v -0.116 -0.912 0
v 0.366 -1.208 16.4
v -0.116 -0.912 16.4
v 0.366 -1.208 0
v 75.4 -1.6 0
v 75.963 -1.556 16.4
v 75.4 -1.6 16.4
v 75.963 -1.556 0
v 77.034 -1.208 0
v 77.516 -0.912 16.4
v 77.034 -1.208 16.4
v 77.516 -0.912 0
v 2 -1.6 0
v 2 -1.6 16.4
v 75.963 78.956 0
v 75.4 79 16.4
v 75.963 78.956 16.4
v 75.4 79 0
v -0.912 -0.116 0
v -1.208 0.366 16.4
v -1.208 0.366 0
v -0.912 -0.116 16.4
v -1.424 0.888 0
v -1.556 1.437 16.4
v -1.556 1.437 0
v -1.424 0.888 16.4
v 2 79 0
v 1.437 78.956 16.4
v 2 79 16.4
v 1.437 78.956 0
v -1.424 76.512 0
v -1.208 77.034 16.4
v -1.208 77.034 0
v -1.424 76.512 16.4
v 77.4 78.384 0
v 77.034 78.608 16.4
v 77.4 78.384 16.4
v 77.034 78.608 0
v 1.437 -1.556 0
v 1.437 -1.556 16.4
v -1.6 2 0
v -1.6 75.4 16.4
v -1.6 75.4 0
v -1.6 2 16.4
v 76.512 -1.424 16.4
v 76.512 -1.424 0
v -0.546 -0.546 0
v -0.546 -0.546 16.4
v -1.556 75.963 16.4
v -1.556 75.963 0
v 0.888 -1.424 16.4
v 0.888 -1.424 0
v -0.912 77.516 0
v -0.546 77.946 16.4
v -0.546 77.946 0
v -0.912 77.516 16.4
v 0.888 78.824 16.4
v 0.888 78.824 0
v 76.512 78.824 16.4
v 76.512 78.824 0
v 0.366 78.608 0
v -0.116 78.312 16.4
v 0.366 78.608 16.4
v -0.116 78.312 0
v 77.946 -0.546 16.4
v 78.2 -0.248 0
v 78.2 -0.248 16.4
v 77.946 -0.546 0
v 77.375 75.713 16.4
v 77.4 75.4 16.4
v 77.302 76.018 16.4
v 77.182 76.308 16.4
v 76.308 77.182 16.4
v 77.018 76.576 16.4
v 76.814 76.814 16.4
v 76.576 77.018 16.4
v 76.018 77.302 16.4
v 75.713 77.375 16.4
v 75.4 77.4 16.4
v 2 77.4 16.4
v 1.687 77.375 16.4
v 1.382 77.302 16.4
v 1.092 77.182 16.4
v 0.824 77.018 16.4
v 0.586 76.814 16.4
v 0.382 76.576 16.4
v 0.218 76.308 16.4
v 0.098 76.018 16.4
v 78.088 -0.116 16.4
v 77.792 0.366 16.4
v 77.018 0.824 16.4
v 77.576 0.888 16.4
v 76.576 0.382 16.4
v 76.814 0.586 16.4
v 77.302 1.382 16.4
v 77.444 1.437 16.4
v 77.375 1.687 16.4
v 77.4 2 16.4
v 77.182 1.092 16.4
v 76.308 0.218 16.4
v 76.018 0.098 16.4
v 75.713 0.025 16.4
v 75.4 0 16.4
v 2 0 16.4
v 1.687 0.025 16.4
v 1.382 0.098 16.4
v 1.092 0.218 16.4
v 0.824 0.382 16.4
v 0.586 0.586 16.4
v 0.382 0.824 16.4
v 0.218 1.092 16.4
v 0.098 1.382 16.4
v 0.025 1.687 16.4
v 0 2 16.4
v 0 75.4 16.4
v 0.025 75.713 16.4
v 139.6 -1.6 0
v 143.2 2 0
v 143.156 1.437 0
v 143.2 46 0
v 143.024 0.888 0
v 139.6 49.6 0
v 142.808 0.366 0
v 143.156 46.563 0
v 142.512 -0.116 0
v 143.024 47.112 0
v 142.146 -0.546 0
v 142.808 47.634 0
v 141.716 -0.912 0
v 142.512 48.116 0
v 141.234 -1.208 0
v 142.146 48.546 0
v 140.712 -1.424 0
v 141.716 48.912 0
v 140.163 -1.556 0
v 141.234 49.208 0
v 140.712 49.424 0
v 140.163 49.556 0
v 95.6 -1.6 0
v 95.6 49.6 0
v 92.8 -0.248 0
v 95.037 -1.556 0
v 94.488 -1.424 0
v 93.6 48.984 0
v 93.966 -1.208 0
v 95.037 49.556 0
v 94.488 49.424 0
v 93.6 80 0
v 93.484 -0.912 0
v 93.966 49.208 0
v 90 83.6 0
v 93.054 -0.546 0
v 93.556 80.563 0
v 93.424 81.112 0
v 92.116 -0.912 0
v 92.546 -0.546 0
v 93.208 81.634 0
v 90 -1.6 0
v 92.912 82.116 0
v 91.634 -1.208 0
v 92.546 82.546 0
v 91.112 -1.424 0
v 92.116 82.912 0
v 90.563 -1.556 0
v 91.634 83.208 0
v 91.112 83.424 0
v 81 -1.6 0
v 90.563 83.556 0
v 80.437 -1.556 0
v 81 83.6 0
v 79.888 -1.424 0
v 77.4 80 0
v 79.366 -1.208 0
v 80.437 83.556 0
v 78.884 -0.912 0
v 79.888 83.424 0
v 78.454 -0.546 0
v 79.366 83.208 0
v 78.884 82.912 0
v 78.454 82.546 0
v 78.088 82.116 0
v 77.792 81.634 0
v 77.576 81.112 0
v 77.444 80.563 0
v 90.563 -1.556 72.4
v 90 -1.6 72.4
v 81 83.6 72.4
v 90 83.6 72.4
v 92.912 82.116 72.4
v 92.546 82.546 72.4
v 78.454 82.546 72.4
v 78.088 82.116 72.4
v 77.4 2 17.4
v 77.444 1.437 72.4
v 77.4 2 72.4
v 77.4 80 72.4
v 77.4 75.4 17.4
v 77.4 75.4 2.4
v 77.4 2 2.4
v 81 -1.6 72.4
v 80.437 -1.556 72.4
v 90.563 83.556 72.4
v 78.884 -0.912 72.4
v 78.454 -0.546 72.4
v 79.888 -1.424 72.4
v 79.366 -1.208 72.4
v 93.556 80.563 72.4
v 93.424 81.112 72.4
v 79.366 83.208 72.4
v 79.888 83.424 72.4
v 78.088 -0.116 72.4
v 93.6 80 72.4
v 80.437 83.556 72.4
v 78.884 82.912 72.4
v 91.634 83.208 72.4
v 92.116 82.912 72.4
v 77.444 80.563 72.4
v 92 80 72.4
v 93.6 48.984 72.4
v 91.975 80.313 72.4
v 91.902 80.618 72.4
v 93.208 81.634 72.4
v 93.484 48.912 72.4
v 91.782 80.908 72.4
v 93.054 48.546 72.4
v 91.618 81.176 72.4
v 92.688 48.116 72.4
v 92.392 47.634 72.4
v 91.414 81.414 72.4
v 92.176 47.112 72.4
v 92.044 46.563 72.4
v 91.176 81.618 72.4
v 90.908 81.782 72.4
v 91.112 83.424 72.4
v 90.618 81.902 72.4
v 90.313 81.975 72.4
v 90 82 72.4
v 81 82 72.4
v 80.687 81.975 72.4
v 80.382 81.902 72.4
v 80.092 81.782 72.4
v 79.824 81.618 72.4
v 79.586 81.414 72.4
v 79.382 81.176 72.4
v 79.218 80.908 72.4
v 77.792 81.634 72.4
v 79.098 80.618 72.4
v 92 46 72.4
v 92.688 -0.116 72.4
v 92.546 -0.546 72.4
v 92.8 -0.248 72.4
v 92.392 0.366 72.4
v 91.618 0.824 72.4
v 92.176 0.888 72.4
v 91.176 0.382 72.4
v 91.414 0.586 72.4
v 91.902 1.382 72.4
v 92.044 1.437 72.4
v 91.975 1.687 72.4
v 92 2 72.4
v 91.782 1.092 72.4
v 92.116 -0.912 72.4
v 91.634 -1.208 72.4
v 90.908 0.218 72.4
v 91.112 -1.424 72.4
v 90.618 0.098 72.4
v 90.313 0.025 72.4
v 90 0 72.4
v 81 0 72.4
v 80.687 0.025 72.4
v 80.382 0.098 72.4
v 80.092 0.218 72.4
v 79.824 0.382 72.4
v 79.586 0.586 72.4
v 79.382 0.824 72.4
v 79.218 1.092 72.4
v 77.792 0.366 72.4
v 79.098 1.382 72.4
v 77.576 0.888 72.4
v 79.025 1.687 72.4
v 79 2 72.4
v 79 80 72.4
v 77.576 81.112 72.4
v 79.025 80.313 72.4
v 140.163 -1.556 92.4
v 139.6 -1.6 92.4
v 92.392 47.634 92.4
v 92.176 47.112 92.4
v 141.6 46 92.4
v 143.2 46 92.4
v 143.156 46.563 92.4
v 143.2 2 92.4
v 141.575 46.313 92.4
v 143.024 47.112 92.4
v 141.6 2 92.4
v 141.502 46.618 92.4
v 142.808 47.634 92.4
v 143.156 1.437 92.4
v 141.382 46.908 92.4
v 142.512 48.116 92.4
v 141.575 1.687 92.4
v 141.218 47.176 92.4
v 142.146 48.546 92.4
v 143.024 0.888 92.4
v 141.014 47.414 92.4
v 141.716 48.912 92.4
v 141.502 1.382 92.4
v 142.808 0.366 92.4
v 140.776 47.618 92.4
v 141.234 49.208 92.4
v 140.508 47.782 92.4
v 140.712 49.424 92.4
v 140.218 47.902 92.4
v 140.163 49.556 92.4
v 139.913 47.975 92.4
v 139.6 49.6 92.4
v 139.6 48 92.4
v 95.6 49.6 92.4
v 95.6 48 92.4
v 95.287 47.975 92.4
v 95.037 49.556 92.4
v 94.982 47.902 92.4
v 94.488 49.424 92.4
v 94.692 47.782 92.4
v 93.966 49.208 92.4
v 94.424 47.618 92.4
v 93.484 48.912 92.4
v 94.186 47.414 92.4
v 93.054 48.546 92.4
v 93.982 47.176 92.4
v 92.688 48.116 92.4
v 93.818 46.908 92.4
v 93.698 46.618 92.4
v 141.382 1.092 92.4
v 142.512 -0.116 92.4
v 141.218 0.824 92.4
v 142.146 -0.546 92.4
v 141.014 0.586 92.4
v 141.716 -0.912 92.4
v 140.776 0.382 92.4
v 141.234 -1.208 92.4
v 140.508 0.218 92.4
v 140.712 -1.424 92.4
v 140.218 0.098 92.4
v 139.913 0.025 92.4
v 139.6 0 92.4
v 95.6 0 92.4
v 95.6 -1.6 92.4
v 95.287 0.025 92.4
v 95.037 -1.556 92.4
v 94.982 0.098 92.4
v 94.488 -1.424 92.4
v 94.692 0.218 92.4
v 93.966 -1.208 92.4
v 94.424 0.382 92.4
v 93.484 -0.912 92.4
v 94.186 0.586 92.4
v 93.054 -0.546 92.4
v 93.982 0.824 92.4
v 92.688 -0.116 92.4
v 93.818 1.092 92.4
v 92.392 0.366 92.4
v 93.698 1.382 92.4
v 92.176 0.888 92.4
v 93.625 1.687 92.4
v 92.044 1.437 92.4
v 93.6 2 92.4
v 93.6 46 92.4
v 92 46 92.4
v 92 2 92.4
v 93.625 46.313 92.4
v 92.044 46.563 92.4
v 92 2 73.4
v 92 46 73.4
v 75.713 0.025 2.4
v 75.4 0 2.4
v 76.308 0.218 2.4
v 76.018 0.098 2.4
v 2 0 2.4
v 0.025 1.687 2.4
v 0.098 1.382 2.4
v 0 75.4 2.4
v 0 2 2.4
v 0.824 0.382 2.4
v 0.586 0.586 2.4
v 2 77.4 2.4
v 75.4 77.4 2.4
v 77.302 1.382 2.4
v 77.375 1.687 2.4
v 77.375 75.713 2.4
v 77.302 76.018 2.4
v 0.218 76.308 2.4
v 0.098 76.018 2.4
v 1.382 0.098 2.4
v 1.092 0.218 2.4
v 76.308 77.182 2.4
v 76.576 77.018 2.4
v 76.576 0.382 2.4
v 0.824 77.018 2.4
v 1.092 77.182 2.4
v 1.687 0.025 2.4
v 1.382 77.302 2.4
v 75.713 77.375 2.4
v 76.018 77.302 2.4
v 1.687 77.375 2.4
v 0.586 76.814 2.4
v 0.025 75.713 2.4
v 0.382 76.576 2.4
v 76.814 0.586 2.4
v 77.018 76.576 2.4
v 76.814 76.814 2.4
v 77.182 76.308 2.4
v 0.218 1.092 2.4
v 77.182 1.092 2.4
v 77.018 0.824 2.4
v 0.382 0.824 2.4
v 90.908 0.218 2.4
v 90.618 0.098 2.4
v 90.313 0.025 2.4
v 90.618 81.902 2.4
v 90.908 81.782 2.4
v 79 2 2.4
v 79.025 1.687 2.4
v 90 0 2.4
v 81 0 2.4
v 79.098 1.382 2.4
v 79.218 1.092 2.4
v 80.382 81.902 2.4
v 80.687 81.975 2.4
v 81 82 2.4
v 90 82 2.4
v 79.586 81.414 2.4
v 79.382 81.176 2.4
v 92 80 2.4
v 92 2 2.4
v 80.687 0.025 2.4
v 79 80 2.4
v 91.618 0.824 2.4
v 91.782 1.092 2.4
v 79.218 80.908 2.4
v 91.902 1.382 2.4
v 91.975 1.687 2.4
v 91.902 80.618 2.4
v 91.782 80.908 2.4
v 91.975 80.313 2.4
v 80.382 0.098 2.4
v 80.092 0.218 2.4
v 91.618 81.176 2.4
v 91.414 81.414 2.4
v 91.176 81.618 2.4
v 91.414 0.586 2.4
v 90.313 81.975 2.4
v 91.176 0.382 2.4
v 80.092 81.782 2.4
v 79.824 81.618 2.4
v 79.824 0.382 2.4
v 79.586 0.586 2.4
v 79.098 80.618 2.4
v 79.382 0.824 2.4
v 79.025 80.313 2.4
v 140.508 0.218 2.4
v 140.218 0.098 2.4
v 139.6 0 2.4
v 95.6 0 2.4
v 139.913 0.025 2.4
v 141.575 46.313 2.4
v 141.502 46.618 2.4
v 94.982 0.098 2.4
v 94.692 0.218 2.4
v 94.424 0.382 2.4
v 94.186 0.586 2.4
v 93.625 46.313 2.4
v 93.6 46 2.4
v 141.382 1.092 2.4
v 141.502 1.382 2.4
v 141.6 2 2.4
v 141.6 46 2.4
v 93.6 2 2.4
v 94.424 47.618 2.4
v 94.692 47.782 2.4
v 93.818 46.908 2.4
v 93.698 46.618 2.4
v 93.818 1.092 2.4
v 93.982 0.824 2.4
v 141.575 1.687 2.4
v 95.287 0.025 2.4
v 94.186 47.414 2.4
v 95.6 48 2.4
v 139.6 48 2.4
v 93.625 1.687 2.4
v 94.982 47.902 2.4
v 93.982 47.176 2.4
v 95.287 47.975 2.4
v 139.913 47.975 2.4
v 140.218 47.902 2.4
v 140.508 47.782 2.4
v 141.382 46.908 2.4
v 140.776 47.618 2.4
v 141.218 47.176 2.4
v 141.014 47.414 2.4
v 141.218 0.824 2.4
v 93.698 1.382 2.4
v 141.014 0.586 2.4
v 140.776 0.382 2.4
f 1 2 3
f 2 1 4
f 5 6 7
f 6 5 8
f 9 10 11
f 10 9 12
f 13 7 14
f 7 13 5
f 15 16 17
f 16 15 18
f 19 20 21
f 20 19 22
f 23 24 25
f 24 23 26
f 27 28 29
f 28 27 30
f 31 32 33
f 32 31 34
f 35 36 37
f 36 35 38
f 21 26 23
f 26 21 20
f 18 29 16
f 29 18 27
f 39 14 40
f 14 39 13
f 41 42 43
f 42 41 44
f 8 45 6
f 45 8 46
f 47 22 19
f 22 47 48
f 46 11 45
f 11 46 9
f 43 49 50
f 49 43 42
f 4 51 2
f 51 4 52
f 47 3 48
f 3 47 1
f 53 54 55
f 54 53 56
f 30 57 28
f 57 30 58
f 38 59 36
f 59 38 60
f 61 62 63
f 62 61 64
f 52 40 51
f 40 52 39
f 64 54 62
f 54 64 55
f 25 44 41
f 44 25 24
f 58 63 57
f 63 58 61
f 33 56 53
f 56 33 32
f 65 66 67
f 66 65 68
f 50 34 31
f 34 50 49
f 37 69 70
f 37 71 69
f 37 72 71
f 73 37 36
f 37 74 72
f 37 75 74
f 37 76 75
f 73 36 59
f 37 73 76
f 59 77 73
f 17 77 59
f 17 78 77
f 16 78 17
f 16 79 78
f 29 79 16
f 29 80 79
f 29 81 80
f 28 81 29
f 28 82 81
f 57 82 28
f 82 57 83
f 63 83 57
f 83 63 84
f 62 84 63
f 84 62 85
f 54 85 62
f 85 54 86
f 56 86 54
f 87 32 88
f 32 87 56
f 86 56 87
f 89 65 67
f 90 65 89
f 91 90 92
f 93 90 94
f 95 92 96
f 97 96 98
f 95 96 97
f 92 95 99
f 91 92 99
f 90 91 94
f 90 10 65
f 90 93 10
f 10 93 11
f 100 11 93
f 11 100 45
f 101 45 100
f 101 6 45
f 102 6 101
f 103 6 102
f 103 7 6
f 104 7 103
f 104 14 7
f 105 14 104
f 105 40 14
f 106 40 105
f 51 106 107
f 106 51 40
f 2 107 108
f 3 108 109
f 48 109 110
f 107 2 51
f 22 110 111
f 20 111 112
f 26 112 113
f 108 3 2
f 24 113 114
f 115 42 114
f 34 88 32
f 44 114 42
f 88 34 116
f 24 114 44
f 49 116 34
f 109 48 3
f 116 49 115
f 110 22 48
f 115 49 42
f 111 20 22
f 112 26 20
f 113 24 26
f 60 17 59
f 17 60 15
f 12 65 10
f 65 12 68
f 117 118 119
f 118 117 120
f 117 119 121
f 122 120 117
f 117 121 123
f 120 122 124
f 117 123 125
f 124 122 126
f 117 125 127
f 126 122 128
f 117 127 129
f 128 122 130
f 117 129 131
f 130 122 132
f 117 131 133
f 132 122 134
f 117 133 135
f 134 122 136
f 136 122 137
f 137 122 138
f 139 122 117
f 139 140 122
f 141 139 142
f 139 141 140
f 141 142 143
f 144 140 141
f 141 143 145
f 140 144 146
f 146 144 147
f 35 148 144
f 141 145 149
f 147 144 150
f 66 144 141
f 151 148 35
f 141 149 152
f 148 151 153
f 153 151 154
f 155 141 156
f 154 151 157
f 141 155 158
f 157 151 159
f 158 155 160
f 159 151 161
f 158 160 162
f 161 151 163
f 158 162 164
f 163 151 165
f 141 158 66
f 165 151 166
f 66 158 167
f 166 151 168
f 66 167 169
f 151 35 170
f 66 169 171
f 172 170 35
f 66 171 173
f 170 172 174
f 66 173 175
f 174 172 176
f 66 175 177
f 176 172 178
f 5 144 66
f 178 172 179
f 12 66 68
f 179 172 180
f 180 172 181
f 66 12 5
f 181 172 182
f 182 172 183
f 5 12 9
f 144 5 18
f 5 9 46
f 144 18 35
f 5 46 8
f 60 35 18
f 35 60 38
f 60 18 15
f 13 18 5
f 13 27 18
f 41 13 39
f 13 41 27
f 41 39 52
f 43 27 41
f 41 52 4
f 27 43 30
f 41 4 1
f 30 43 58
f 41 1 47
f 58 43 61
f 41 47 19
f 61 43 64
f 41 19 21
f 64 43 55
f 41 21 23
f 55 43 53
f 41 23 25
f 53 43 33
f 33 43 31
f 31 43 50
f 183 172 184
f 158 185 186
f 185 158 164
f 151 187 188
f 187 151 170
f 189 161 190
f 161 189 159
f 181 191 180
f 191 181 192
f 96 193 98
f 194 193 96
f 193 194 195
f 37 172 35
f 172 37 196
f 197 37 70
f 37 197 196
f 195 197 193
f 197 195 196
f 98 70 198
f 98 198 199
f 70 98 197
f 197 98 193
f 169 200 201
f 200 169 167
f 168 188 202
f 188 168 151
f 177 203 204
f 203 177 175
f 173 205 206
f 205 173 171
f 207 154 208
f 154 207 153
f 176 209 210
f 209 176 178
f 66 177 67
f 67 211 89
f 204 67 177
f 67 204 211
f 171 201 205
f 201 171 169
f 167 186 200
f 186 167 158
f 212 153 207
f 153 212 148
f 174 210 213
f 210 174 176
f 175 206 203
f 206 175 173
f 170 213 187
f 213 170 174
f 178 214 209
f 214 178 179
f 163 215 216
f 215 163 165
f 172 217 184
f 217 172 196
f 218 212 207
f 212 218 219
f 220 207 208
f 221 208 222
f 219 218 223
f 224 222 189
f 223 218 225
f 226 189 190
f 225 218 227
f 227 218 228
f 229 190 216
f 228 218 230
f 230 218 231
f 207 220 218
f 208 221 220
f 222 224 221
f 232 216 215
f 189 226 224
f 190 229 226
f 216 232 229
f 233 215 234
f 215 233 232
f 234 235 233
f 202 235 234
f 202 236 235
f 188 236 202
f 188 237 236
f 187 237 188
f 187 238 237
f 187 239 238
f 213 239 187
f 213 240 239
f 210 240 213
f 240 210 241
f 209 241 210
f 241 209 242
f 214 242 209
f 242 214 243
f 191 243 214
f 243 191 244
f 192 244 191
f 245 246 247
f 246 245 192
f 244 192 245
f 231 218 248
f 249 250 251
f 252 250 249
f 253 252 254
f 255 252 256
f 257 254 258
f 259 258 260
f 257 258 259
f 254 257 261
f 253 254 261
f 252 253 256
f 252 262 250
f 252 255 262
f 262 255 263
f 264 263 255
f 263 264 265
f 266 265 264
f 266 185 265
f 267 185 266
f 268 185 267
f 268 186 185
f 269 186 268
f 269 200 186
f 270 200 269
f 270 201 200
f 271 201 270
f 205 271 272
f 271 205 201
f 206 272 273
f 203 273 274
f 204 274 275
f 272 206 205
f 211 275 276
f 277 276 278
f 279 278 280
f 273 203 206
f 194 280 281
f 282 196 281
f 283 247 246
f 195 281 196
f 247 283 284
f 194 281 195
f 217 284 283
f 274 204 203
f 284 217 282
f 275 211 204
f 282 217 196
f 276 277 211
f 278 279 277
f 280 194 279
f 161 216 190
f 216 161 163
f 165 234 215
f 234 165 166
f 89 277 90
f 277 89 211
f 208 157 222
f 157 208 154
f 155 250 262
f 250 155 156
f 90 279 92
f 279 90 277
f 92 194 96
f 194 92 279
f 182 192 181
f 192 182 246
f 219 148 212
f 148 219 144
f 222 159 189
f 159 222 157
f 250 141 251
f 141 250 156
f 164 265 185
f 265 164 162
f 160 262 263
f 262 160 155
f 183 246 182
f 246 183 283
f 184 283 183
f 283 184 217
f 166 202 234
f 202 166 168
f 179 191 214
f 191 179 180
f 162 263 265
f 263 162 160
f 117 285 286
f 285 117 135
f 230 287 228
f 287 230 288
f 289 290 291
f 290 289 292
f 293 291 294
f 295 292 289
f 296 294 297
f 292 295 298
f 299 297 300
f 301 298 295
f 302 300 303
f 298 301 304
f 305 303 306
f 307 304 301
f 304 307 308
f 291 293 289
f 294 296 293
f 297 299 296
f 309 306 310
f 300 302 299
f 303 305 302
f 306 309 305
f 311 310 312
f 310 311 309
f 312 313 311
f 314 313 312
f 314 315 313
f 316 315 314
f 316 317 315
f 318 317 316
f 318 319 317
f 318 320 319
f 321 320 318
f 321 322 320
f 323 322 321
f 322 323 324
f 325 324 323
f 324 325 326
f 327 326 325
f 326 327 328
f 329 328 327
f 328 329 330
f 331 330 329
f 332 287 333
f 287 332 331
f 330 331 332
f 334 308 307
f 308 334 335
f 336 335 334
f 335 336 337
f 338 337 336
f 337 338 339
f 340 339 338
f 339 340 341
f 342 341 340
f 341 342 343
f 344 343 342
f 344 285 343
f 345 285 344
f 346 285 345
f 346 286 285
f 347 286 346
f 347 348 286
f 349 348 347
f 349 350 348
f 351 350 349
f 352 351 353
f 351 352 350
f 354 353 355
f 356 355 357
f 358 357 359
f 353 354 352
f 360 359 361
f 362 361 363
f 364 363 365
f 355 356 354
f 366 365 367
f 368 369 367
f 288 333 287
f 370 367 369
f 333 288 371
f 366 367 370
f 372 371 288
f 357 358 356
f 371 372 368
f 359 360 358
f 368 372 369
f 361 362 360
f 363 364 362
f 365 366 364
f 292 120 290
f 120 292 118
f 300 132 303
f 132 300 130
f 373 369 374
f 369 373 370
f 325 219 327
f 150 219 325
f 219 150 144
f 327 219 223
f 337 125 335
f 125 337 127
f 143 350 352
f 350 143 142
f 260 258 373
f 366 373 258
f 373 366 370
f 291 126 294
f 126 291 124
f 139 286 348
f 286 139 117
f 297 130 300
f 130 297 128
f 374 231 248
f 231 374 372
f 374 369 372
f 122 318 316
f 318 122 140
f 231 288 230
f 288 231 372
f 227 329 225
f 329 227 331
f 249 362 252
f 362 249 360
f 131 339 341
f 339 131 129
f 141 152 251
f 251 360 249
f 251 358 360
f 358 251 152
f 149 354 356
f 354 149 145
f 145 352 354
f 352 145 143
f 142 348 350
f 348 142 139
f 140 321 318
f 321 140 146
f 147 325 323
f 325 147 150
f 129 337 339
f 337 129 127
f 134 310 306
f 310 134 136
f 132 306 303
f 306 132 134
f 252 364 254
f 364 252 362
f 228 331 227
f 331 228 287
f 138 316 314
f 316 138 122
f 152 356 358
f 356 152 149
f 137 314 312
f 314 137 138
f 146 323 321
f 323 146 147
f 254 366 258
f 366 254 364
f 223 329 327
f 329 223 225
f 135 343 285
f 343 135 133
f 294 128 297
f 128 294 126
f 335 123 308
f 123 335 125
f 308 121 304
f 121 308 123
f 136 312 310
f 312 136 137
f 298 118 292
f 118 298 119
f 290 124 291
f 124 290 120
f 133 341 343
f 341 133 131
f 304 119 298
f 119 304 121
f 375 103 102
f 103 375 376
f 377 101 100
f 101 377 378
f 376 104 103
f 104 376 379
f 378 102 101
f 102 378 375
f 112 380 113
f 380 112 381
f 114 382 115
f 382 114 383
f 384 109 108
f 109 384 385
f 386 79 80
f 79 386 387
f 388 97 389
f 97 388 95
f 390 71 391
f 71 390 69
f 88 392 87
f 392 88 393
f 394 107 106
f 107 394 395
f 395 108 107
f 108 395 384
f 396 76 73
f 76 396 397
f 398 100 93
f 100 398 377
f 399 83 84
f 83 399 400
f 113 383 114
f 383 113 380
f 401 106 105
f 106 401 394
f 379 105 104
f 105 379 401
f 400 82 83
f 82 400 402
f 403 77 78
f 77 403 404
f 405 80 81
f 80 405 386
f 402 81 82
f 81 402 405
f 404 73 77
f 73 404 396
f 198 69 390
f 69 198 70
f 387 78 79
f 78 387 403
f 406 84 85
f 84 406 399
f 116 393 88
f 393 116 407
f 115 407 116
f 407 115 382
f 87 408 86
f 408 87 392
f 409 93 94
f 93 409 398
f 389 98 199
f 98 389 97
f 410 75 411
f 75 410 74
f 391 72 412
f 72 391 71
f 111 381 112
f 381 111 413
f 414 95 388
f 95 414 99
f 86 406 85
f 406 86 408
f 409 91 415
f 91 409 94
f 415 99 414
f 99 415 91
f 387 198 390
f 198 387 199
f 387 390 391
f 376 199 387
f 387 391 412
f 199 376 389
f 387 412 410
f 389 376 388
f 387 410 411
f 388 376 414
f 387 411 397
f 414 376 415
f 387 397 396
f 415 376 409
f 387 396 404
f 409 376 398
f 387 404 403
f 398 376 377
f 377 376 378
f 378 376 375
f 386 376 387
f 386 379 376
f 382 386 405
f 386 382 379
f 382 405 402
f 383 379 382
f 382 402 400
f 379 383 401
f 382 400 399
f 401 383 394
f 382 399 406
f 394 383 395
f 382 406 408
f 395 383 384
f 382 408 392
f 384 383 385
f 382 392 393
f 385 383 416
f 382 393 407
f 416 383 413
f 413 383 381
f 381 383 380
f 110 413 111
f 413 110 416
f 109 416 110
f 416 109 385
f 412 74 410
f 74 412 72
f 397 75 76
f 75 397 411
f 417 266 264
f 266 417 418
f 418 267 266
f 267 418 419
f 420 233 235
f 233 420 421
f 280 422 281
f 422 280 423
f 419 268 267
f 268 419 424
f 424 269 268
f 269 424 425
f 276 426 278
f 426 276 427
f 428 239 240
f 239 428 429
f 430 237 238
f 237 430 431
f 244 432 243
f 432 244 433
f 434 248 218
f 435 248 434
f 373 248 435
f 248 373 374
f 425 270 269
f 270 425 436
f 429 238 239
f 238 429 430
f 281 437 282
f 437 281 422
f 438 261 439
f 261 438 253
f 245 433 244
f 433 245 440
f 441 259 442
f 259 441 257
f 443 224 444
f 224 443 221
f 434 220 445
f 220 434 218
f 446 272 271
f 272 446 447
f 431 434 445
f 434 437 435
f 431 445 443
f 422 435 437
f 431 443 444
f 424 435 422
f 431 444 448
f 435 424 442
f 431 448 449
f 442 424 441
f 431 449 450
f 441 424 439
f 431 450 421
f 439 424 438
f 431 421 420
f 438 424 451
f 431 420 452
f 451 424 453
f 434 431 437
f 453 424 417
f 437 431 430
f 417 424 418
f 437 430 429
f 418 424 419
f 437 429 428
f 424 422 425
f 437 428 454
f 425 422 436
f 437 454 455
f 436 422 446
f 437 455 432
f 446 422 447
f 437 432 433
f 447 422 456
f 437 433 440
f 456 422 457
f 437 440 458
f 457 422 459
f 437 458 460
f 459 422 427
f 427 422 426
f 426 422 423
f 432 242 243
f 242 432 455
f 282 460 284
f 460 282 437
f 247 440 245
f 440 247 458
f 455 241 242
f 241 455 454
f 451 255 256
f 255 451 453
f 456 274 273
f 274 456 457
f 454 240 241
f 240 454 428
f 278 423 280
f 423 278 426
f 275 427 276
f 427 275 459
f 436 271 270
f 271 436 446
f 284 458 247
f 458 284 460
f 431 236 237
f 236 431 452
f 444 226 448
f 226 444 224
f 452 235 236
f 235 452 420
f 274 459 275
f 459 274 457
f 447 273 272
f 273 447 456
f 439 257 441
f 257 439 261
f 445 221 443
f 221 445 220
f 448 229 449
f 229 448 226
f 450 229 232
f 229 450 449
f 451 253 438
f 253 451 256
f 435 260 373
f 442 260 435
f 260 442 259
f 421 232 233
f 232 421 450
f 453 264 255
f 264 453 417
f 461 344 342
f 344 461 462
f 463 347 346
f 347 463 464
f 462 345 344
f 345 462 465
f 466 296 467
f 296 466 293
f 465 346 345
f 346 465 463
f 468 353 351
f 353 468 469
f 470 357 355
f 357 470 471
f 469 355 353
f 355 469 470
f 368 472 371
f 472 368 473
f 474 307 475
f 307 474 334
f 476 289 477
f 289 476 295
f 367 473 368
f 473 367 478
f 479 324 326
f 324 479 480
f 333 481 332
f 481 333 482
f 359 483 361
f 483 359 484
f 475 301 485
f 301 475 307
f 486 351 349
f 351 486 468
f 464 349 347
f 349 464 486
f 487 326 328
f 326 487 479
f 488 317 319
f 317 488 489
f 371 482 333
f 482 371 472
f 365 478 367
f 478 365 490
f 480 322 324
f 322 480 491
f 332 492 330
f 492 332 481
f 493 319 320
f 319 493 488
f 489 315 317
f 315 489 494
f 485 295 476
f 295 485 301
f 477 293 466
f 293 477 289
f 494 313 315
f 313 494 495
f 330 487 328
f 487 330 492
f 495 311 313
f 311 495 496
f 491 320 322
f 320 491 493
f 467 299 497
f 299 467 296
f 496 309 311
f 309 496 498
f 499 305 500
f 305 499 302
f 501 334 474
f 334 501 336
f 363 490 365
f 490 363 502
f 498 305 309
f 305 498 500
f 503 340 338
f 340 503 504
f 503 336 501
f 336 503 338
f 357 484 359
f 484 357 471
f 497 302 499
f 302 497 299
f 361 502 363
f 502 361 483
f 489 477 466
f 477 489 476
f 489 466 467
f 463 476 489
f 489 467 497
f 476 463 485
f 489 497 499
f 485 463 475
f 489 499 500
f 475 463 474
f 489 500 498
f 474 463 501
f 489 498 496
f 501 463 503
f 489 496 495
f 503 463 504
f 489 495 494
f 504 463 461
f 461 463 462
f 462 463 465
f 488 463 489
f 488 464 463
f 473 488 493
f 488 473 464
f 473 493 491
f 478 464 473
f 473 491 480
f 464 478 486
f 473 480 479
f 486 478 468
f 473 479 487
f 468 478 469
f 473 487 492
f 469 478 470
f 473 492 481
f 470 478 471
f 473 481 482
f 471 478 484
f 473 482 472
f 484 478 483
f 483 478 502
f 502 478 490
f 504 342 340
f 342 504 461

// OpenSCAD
// Modular desk caddy: pen cups, phone slot, sticky-note pad, business-card slot - original design (Brian Sacco)
// One walled tray; every compartment is a rounded rectangle carved into a shared outer shell.
// Open at the top, solid floor: prints as oriented with no supports.
layout  = "full";   // "full", "work", "phone"
phone_t = 13;       // phone slot width: phone + case (13 normal, 18 rugged case)
wall    = 1.6;
base    = 2.4;
r       = 2;        // corner radius of every cavity
$fn = 40;

note = 76.2 + 1.2;  // 3 x 3 in sticky-note pad + 1.2 mm
card = [90, 9];     // 88.9 x 50.8 mm (3.5 x 2 in) card, 90 mm long, 9 mm thick (about 30 cards)
phone_len = 82;     // iPhone 16 Pro Max is 77.6 mm wide
pen = 48;           // pen cup, about 20 pens

// [x, y, w, d, h] - cavities (inner size), wall-thick shared walls between neighbours
function cavities() =
    layout == "full" ? [
        [0, 0, note, note, 14],
        [note + wall, 0, phone_t, phone_len, 70],
        [note + phone_t + 2 * wall, 0, pen, pen, 90]
    ] :
    layout == "work" ? [
        [0, 0, note, note, 14],
        [0, note + wall, card[0], card[1], 30],
        [card[0] + wall, 0, pen, pen, 90],
        [card[0] + wall, pen + wall, pen, pen, 80]
    ] : [
        [0, 0, phone_t, phone_len, 70],
        [phone_t + wall, 0, 40, 40, 14],
        [phone_t + wall, 40 + wall, 40, 40, 70]
    ];

module rr(w, d, rad) { translate([rad, rad]) offset(r = rad) square([w - 2 * rad, d - 2 * rad]); }

c = cavities();
difference() {
    union() for (k = c)
        translate([k[0] - wall, k[1] - wall, 0]) linear_extrude(k[4] + base) rr(k[2] + 2 * wall, k[3] + 2 * wall, r + wall);
    for (k = c)
        translate([k[0], k[1], base]) linear_extrude(k[4] + 1) rr(k[2], k[3], r);
}
